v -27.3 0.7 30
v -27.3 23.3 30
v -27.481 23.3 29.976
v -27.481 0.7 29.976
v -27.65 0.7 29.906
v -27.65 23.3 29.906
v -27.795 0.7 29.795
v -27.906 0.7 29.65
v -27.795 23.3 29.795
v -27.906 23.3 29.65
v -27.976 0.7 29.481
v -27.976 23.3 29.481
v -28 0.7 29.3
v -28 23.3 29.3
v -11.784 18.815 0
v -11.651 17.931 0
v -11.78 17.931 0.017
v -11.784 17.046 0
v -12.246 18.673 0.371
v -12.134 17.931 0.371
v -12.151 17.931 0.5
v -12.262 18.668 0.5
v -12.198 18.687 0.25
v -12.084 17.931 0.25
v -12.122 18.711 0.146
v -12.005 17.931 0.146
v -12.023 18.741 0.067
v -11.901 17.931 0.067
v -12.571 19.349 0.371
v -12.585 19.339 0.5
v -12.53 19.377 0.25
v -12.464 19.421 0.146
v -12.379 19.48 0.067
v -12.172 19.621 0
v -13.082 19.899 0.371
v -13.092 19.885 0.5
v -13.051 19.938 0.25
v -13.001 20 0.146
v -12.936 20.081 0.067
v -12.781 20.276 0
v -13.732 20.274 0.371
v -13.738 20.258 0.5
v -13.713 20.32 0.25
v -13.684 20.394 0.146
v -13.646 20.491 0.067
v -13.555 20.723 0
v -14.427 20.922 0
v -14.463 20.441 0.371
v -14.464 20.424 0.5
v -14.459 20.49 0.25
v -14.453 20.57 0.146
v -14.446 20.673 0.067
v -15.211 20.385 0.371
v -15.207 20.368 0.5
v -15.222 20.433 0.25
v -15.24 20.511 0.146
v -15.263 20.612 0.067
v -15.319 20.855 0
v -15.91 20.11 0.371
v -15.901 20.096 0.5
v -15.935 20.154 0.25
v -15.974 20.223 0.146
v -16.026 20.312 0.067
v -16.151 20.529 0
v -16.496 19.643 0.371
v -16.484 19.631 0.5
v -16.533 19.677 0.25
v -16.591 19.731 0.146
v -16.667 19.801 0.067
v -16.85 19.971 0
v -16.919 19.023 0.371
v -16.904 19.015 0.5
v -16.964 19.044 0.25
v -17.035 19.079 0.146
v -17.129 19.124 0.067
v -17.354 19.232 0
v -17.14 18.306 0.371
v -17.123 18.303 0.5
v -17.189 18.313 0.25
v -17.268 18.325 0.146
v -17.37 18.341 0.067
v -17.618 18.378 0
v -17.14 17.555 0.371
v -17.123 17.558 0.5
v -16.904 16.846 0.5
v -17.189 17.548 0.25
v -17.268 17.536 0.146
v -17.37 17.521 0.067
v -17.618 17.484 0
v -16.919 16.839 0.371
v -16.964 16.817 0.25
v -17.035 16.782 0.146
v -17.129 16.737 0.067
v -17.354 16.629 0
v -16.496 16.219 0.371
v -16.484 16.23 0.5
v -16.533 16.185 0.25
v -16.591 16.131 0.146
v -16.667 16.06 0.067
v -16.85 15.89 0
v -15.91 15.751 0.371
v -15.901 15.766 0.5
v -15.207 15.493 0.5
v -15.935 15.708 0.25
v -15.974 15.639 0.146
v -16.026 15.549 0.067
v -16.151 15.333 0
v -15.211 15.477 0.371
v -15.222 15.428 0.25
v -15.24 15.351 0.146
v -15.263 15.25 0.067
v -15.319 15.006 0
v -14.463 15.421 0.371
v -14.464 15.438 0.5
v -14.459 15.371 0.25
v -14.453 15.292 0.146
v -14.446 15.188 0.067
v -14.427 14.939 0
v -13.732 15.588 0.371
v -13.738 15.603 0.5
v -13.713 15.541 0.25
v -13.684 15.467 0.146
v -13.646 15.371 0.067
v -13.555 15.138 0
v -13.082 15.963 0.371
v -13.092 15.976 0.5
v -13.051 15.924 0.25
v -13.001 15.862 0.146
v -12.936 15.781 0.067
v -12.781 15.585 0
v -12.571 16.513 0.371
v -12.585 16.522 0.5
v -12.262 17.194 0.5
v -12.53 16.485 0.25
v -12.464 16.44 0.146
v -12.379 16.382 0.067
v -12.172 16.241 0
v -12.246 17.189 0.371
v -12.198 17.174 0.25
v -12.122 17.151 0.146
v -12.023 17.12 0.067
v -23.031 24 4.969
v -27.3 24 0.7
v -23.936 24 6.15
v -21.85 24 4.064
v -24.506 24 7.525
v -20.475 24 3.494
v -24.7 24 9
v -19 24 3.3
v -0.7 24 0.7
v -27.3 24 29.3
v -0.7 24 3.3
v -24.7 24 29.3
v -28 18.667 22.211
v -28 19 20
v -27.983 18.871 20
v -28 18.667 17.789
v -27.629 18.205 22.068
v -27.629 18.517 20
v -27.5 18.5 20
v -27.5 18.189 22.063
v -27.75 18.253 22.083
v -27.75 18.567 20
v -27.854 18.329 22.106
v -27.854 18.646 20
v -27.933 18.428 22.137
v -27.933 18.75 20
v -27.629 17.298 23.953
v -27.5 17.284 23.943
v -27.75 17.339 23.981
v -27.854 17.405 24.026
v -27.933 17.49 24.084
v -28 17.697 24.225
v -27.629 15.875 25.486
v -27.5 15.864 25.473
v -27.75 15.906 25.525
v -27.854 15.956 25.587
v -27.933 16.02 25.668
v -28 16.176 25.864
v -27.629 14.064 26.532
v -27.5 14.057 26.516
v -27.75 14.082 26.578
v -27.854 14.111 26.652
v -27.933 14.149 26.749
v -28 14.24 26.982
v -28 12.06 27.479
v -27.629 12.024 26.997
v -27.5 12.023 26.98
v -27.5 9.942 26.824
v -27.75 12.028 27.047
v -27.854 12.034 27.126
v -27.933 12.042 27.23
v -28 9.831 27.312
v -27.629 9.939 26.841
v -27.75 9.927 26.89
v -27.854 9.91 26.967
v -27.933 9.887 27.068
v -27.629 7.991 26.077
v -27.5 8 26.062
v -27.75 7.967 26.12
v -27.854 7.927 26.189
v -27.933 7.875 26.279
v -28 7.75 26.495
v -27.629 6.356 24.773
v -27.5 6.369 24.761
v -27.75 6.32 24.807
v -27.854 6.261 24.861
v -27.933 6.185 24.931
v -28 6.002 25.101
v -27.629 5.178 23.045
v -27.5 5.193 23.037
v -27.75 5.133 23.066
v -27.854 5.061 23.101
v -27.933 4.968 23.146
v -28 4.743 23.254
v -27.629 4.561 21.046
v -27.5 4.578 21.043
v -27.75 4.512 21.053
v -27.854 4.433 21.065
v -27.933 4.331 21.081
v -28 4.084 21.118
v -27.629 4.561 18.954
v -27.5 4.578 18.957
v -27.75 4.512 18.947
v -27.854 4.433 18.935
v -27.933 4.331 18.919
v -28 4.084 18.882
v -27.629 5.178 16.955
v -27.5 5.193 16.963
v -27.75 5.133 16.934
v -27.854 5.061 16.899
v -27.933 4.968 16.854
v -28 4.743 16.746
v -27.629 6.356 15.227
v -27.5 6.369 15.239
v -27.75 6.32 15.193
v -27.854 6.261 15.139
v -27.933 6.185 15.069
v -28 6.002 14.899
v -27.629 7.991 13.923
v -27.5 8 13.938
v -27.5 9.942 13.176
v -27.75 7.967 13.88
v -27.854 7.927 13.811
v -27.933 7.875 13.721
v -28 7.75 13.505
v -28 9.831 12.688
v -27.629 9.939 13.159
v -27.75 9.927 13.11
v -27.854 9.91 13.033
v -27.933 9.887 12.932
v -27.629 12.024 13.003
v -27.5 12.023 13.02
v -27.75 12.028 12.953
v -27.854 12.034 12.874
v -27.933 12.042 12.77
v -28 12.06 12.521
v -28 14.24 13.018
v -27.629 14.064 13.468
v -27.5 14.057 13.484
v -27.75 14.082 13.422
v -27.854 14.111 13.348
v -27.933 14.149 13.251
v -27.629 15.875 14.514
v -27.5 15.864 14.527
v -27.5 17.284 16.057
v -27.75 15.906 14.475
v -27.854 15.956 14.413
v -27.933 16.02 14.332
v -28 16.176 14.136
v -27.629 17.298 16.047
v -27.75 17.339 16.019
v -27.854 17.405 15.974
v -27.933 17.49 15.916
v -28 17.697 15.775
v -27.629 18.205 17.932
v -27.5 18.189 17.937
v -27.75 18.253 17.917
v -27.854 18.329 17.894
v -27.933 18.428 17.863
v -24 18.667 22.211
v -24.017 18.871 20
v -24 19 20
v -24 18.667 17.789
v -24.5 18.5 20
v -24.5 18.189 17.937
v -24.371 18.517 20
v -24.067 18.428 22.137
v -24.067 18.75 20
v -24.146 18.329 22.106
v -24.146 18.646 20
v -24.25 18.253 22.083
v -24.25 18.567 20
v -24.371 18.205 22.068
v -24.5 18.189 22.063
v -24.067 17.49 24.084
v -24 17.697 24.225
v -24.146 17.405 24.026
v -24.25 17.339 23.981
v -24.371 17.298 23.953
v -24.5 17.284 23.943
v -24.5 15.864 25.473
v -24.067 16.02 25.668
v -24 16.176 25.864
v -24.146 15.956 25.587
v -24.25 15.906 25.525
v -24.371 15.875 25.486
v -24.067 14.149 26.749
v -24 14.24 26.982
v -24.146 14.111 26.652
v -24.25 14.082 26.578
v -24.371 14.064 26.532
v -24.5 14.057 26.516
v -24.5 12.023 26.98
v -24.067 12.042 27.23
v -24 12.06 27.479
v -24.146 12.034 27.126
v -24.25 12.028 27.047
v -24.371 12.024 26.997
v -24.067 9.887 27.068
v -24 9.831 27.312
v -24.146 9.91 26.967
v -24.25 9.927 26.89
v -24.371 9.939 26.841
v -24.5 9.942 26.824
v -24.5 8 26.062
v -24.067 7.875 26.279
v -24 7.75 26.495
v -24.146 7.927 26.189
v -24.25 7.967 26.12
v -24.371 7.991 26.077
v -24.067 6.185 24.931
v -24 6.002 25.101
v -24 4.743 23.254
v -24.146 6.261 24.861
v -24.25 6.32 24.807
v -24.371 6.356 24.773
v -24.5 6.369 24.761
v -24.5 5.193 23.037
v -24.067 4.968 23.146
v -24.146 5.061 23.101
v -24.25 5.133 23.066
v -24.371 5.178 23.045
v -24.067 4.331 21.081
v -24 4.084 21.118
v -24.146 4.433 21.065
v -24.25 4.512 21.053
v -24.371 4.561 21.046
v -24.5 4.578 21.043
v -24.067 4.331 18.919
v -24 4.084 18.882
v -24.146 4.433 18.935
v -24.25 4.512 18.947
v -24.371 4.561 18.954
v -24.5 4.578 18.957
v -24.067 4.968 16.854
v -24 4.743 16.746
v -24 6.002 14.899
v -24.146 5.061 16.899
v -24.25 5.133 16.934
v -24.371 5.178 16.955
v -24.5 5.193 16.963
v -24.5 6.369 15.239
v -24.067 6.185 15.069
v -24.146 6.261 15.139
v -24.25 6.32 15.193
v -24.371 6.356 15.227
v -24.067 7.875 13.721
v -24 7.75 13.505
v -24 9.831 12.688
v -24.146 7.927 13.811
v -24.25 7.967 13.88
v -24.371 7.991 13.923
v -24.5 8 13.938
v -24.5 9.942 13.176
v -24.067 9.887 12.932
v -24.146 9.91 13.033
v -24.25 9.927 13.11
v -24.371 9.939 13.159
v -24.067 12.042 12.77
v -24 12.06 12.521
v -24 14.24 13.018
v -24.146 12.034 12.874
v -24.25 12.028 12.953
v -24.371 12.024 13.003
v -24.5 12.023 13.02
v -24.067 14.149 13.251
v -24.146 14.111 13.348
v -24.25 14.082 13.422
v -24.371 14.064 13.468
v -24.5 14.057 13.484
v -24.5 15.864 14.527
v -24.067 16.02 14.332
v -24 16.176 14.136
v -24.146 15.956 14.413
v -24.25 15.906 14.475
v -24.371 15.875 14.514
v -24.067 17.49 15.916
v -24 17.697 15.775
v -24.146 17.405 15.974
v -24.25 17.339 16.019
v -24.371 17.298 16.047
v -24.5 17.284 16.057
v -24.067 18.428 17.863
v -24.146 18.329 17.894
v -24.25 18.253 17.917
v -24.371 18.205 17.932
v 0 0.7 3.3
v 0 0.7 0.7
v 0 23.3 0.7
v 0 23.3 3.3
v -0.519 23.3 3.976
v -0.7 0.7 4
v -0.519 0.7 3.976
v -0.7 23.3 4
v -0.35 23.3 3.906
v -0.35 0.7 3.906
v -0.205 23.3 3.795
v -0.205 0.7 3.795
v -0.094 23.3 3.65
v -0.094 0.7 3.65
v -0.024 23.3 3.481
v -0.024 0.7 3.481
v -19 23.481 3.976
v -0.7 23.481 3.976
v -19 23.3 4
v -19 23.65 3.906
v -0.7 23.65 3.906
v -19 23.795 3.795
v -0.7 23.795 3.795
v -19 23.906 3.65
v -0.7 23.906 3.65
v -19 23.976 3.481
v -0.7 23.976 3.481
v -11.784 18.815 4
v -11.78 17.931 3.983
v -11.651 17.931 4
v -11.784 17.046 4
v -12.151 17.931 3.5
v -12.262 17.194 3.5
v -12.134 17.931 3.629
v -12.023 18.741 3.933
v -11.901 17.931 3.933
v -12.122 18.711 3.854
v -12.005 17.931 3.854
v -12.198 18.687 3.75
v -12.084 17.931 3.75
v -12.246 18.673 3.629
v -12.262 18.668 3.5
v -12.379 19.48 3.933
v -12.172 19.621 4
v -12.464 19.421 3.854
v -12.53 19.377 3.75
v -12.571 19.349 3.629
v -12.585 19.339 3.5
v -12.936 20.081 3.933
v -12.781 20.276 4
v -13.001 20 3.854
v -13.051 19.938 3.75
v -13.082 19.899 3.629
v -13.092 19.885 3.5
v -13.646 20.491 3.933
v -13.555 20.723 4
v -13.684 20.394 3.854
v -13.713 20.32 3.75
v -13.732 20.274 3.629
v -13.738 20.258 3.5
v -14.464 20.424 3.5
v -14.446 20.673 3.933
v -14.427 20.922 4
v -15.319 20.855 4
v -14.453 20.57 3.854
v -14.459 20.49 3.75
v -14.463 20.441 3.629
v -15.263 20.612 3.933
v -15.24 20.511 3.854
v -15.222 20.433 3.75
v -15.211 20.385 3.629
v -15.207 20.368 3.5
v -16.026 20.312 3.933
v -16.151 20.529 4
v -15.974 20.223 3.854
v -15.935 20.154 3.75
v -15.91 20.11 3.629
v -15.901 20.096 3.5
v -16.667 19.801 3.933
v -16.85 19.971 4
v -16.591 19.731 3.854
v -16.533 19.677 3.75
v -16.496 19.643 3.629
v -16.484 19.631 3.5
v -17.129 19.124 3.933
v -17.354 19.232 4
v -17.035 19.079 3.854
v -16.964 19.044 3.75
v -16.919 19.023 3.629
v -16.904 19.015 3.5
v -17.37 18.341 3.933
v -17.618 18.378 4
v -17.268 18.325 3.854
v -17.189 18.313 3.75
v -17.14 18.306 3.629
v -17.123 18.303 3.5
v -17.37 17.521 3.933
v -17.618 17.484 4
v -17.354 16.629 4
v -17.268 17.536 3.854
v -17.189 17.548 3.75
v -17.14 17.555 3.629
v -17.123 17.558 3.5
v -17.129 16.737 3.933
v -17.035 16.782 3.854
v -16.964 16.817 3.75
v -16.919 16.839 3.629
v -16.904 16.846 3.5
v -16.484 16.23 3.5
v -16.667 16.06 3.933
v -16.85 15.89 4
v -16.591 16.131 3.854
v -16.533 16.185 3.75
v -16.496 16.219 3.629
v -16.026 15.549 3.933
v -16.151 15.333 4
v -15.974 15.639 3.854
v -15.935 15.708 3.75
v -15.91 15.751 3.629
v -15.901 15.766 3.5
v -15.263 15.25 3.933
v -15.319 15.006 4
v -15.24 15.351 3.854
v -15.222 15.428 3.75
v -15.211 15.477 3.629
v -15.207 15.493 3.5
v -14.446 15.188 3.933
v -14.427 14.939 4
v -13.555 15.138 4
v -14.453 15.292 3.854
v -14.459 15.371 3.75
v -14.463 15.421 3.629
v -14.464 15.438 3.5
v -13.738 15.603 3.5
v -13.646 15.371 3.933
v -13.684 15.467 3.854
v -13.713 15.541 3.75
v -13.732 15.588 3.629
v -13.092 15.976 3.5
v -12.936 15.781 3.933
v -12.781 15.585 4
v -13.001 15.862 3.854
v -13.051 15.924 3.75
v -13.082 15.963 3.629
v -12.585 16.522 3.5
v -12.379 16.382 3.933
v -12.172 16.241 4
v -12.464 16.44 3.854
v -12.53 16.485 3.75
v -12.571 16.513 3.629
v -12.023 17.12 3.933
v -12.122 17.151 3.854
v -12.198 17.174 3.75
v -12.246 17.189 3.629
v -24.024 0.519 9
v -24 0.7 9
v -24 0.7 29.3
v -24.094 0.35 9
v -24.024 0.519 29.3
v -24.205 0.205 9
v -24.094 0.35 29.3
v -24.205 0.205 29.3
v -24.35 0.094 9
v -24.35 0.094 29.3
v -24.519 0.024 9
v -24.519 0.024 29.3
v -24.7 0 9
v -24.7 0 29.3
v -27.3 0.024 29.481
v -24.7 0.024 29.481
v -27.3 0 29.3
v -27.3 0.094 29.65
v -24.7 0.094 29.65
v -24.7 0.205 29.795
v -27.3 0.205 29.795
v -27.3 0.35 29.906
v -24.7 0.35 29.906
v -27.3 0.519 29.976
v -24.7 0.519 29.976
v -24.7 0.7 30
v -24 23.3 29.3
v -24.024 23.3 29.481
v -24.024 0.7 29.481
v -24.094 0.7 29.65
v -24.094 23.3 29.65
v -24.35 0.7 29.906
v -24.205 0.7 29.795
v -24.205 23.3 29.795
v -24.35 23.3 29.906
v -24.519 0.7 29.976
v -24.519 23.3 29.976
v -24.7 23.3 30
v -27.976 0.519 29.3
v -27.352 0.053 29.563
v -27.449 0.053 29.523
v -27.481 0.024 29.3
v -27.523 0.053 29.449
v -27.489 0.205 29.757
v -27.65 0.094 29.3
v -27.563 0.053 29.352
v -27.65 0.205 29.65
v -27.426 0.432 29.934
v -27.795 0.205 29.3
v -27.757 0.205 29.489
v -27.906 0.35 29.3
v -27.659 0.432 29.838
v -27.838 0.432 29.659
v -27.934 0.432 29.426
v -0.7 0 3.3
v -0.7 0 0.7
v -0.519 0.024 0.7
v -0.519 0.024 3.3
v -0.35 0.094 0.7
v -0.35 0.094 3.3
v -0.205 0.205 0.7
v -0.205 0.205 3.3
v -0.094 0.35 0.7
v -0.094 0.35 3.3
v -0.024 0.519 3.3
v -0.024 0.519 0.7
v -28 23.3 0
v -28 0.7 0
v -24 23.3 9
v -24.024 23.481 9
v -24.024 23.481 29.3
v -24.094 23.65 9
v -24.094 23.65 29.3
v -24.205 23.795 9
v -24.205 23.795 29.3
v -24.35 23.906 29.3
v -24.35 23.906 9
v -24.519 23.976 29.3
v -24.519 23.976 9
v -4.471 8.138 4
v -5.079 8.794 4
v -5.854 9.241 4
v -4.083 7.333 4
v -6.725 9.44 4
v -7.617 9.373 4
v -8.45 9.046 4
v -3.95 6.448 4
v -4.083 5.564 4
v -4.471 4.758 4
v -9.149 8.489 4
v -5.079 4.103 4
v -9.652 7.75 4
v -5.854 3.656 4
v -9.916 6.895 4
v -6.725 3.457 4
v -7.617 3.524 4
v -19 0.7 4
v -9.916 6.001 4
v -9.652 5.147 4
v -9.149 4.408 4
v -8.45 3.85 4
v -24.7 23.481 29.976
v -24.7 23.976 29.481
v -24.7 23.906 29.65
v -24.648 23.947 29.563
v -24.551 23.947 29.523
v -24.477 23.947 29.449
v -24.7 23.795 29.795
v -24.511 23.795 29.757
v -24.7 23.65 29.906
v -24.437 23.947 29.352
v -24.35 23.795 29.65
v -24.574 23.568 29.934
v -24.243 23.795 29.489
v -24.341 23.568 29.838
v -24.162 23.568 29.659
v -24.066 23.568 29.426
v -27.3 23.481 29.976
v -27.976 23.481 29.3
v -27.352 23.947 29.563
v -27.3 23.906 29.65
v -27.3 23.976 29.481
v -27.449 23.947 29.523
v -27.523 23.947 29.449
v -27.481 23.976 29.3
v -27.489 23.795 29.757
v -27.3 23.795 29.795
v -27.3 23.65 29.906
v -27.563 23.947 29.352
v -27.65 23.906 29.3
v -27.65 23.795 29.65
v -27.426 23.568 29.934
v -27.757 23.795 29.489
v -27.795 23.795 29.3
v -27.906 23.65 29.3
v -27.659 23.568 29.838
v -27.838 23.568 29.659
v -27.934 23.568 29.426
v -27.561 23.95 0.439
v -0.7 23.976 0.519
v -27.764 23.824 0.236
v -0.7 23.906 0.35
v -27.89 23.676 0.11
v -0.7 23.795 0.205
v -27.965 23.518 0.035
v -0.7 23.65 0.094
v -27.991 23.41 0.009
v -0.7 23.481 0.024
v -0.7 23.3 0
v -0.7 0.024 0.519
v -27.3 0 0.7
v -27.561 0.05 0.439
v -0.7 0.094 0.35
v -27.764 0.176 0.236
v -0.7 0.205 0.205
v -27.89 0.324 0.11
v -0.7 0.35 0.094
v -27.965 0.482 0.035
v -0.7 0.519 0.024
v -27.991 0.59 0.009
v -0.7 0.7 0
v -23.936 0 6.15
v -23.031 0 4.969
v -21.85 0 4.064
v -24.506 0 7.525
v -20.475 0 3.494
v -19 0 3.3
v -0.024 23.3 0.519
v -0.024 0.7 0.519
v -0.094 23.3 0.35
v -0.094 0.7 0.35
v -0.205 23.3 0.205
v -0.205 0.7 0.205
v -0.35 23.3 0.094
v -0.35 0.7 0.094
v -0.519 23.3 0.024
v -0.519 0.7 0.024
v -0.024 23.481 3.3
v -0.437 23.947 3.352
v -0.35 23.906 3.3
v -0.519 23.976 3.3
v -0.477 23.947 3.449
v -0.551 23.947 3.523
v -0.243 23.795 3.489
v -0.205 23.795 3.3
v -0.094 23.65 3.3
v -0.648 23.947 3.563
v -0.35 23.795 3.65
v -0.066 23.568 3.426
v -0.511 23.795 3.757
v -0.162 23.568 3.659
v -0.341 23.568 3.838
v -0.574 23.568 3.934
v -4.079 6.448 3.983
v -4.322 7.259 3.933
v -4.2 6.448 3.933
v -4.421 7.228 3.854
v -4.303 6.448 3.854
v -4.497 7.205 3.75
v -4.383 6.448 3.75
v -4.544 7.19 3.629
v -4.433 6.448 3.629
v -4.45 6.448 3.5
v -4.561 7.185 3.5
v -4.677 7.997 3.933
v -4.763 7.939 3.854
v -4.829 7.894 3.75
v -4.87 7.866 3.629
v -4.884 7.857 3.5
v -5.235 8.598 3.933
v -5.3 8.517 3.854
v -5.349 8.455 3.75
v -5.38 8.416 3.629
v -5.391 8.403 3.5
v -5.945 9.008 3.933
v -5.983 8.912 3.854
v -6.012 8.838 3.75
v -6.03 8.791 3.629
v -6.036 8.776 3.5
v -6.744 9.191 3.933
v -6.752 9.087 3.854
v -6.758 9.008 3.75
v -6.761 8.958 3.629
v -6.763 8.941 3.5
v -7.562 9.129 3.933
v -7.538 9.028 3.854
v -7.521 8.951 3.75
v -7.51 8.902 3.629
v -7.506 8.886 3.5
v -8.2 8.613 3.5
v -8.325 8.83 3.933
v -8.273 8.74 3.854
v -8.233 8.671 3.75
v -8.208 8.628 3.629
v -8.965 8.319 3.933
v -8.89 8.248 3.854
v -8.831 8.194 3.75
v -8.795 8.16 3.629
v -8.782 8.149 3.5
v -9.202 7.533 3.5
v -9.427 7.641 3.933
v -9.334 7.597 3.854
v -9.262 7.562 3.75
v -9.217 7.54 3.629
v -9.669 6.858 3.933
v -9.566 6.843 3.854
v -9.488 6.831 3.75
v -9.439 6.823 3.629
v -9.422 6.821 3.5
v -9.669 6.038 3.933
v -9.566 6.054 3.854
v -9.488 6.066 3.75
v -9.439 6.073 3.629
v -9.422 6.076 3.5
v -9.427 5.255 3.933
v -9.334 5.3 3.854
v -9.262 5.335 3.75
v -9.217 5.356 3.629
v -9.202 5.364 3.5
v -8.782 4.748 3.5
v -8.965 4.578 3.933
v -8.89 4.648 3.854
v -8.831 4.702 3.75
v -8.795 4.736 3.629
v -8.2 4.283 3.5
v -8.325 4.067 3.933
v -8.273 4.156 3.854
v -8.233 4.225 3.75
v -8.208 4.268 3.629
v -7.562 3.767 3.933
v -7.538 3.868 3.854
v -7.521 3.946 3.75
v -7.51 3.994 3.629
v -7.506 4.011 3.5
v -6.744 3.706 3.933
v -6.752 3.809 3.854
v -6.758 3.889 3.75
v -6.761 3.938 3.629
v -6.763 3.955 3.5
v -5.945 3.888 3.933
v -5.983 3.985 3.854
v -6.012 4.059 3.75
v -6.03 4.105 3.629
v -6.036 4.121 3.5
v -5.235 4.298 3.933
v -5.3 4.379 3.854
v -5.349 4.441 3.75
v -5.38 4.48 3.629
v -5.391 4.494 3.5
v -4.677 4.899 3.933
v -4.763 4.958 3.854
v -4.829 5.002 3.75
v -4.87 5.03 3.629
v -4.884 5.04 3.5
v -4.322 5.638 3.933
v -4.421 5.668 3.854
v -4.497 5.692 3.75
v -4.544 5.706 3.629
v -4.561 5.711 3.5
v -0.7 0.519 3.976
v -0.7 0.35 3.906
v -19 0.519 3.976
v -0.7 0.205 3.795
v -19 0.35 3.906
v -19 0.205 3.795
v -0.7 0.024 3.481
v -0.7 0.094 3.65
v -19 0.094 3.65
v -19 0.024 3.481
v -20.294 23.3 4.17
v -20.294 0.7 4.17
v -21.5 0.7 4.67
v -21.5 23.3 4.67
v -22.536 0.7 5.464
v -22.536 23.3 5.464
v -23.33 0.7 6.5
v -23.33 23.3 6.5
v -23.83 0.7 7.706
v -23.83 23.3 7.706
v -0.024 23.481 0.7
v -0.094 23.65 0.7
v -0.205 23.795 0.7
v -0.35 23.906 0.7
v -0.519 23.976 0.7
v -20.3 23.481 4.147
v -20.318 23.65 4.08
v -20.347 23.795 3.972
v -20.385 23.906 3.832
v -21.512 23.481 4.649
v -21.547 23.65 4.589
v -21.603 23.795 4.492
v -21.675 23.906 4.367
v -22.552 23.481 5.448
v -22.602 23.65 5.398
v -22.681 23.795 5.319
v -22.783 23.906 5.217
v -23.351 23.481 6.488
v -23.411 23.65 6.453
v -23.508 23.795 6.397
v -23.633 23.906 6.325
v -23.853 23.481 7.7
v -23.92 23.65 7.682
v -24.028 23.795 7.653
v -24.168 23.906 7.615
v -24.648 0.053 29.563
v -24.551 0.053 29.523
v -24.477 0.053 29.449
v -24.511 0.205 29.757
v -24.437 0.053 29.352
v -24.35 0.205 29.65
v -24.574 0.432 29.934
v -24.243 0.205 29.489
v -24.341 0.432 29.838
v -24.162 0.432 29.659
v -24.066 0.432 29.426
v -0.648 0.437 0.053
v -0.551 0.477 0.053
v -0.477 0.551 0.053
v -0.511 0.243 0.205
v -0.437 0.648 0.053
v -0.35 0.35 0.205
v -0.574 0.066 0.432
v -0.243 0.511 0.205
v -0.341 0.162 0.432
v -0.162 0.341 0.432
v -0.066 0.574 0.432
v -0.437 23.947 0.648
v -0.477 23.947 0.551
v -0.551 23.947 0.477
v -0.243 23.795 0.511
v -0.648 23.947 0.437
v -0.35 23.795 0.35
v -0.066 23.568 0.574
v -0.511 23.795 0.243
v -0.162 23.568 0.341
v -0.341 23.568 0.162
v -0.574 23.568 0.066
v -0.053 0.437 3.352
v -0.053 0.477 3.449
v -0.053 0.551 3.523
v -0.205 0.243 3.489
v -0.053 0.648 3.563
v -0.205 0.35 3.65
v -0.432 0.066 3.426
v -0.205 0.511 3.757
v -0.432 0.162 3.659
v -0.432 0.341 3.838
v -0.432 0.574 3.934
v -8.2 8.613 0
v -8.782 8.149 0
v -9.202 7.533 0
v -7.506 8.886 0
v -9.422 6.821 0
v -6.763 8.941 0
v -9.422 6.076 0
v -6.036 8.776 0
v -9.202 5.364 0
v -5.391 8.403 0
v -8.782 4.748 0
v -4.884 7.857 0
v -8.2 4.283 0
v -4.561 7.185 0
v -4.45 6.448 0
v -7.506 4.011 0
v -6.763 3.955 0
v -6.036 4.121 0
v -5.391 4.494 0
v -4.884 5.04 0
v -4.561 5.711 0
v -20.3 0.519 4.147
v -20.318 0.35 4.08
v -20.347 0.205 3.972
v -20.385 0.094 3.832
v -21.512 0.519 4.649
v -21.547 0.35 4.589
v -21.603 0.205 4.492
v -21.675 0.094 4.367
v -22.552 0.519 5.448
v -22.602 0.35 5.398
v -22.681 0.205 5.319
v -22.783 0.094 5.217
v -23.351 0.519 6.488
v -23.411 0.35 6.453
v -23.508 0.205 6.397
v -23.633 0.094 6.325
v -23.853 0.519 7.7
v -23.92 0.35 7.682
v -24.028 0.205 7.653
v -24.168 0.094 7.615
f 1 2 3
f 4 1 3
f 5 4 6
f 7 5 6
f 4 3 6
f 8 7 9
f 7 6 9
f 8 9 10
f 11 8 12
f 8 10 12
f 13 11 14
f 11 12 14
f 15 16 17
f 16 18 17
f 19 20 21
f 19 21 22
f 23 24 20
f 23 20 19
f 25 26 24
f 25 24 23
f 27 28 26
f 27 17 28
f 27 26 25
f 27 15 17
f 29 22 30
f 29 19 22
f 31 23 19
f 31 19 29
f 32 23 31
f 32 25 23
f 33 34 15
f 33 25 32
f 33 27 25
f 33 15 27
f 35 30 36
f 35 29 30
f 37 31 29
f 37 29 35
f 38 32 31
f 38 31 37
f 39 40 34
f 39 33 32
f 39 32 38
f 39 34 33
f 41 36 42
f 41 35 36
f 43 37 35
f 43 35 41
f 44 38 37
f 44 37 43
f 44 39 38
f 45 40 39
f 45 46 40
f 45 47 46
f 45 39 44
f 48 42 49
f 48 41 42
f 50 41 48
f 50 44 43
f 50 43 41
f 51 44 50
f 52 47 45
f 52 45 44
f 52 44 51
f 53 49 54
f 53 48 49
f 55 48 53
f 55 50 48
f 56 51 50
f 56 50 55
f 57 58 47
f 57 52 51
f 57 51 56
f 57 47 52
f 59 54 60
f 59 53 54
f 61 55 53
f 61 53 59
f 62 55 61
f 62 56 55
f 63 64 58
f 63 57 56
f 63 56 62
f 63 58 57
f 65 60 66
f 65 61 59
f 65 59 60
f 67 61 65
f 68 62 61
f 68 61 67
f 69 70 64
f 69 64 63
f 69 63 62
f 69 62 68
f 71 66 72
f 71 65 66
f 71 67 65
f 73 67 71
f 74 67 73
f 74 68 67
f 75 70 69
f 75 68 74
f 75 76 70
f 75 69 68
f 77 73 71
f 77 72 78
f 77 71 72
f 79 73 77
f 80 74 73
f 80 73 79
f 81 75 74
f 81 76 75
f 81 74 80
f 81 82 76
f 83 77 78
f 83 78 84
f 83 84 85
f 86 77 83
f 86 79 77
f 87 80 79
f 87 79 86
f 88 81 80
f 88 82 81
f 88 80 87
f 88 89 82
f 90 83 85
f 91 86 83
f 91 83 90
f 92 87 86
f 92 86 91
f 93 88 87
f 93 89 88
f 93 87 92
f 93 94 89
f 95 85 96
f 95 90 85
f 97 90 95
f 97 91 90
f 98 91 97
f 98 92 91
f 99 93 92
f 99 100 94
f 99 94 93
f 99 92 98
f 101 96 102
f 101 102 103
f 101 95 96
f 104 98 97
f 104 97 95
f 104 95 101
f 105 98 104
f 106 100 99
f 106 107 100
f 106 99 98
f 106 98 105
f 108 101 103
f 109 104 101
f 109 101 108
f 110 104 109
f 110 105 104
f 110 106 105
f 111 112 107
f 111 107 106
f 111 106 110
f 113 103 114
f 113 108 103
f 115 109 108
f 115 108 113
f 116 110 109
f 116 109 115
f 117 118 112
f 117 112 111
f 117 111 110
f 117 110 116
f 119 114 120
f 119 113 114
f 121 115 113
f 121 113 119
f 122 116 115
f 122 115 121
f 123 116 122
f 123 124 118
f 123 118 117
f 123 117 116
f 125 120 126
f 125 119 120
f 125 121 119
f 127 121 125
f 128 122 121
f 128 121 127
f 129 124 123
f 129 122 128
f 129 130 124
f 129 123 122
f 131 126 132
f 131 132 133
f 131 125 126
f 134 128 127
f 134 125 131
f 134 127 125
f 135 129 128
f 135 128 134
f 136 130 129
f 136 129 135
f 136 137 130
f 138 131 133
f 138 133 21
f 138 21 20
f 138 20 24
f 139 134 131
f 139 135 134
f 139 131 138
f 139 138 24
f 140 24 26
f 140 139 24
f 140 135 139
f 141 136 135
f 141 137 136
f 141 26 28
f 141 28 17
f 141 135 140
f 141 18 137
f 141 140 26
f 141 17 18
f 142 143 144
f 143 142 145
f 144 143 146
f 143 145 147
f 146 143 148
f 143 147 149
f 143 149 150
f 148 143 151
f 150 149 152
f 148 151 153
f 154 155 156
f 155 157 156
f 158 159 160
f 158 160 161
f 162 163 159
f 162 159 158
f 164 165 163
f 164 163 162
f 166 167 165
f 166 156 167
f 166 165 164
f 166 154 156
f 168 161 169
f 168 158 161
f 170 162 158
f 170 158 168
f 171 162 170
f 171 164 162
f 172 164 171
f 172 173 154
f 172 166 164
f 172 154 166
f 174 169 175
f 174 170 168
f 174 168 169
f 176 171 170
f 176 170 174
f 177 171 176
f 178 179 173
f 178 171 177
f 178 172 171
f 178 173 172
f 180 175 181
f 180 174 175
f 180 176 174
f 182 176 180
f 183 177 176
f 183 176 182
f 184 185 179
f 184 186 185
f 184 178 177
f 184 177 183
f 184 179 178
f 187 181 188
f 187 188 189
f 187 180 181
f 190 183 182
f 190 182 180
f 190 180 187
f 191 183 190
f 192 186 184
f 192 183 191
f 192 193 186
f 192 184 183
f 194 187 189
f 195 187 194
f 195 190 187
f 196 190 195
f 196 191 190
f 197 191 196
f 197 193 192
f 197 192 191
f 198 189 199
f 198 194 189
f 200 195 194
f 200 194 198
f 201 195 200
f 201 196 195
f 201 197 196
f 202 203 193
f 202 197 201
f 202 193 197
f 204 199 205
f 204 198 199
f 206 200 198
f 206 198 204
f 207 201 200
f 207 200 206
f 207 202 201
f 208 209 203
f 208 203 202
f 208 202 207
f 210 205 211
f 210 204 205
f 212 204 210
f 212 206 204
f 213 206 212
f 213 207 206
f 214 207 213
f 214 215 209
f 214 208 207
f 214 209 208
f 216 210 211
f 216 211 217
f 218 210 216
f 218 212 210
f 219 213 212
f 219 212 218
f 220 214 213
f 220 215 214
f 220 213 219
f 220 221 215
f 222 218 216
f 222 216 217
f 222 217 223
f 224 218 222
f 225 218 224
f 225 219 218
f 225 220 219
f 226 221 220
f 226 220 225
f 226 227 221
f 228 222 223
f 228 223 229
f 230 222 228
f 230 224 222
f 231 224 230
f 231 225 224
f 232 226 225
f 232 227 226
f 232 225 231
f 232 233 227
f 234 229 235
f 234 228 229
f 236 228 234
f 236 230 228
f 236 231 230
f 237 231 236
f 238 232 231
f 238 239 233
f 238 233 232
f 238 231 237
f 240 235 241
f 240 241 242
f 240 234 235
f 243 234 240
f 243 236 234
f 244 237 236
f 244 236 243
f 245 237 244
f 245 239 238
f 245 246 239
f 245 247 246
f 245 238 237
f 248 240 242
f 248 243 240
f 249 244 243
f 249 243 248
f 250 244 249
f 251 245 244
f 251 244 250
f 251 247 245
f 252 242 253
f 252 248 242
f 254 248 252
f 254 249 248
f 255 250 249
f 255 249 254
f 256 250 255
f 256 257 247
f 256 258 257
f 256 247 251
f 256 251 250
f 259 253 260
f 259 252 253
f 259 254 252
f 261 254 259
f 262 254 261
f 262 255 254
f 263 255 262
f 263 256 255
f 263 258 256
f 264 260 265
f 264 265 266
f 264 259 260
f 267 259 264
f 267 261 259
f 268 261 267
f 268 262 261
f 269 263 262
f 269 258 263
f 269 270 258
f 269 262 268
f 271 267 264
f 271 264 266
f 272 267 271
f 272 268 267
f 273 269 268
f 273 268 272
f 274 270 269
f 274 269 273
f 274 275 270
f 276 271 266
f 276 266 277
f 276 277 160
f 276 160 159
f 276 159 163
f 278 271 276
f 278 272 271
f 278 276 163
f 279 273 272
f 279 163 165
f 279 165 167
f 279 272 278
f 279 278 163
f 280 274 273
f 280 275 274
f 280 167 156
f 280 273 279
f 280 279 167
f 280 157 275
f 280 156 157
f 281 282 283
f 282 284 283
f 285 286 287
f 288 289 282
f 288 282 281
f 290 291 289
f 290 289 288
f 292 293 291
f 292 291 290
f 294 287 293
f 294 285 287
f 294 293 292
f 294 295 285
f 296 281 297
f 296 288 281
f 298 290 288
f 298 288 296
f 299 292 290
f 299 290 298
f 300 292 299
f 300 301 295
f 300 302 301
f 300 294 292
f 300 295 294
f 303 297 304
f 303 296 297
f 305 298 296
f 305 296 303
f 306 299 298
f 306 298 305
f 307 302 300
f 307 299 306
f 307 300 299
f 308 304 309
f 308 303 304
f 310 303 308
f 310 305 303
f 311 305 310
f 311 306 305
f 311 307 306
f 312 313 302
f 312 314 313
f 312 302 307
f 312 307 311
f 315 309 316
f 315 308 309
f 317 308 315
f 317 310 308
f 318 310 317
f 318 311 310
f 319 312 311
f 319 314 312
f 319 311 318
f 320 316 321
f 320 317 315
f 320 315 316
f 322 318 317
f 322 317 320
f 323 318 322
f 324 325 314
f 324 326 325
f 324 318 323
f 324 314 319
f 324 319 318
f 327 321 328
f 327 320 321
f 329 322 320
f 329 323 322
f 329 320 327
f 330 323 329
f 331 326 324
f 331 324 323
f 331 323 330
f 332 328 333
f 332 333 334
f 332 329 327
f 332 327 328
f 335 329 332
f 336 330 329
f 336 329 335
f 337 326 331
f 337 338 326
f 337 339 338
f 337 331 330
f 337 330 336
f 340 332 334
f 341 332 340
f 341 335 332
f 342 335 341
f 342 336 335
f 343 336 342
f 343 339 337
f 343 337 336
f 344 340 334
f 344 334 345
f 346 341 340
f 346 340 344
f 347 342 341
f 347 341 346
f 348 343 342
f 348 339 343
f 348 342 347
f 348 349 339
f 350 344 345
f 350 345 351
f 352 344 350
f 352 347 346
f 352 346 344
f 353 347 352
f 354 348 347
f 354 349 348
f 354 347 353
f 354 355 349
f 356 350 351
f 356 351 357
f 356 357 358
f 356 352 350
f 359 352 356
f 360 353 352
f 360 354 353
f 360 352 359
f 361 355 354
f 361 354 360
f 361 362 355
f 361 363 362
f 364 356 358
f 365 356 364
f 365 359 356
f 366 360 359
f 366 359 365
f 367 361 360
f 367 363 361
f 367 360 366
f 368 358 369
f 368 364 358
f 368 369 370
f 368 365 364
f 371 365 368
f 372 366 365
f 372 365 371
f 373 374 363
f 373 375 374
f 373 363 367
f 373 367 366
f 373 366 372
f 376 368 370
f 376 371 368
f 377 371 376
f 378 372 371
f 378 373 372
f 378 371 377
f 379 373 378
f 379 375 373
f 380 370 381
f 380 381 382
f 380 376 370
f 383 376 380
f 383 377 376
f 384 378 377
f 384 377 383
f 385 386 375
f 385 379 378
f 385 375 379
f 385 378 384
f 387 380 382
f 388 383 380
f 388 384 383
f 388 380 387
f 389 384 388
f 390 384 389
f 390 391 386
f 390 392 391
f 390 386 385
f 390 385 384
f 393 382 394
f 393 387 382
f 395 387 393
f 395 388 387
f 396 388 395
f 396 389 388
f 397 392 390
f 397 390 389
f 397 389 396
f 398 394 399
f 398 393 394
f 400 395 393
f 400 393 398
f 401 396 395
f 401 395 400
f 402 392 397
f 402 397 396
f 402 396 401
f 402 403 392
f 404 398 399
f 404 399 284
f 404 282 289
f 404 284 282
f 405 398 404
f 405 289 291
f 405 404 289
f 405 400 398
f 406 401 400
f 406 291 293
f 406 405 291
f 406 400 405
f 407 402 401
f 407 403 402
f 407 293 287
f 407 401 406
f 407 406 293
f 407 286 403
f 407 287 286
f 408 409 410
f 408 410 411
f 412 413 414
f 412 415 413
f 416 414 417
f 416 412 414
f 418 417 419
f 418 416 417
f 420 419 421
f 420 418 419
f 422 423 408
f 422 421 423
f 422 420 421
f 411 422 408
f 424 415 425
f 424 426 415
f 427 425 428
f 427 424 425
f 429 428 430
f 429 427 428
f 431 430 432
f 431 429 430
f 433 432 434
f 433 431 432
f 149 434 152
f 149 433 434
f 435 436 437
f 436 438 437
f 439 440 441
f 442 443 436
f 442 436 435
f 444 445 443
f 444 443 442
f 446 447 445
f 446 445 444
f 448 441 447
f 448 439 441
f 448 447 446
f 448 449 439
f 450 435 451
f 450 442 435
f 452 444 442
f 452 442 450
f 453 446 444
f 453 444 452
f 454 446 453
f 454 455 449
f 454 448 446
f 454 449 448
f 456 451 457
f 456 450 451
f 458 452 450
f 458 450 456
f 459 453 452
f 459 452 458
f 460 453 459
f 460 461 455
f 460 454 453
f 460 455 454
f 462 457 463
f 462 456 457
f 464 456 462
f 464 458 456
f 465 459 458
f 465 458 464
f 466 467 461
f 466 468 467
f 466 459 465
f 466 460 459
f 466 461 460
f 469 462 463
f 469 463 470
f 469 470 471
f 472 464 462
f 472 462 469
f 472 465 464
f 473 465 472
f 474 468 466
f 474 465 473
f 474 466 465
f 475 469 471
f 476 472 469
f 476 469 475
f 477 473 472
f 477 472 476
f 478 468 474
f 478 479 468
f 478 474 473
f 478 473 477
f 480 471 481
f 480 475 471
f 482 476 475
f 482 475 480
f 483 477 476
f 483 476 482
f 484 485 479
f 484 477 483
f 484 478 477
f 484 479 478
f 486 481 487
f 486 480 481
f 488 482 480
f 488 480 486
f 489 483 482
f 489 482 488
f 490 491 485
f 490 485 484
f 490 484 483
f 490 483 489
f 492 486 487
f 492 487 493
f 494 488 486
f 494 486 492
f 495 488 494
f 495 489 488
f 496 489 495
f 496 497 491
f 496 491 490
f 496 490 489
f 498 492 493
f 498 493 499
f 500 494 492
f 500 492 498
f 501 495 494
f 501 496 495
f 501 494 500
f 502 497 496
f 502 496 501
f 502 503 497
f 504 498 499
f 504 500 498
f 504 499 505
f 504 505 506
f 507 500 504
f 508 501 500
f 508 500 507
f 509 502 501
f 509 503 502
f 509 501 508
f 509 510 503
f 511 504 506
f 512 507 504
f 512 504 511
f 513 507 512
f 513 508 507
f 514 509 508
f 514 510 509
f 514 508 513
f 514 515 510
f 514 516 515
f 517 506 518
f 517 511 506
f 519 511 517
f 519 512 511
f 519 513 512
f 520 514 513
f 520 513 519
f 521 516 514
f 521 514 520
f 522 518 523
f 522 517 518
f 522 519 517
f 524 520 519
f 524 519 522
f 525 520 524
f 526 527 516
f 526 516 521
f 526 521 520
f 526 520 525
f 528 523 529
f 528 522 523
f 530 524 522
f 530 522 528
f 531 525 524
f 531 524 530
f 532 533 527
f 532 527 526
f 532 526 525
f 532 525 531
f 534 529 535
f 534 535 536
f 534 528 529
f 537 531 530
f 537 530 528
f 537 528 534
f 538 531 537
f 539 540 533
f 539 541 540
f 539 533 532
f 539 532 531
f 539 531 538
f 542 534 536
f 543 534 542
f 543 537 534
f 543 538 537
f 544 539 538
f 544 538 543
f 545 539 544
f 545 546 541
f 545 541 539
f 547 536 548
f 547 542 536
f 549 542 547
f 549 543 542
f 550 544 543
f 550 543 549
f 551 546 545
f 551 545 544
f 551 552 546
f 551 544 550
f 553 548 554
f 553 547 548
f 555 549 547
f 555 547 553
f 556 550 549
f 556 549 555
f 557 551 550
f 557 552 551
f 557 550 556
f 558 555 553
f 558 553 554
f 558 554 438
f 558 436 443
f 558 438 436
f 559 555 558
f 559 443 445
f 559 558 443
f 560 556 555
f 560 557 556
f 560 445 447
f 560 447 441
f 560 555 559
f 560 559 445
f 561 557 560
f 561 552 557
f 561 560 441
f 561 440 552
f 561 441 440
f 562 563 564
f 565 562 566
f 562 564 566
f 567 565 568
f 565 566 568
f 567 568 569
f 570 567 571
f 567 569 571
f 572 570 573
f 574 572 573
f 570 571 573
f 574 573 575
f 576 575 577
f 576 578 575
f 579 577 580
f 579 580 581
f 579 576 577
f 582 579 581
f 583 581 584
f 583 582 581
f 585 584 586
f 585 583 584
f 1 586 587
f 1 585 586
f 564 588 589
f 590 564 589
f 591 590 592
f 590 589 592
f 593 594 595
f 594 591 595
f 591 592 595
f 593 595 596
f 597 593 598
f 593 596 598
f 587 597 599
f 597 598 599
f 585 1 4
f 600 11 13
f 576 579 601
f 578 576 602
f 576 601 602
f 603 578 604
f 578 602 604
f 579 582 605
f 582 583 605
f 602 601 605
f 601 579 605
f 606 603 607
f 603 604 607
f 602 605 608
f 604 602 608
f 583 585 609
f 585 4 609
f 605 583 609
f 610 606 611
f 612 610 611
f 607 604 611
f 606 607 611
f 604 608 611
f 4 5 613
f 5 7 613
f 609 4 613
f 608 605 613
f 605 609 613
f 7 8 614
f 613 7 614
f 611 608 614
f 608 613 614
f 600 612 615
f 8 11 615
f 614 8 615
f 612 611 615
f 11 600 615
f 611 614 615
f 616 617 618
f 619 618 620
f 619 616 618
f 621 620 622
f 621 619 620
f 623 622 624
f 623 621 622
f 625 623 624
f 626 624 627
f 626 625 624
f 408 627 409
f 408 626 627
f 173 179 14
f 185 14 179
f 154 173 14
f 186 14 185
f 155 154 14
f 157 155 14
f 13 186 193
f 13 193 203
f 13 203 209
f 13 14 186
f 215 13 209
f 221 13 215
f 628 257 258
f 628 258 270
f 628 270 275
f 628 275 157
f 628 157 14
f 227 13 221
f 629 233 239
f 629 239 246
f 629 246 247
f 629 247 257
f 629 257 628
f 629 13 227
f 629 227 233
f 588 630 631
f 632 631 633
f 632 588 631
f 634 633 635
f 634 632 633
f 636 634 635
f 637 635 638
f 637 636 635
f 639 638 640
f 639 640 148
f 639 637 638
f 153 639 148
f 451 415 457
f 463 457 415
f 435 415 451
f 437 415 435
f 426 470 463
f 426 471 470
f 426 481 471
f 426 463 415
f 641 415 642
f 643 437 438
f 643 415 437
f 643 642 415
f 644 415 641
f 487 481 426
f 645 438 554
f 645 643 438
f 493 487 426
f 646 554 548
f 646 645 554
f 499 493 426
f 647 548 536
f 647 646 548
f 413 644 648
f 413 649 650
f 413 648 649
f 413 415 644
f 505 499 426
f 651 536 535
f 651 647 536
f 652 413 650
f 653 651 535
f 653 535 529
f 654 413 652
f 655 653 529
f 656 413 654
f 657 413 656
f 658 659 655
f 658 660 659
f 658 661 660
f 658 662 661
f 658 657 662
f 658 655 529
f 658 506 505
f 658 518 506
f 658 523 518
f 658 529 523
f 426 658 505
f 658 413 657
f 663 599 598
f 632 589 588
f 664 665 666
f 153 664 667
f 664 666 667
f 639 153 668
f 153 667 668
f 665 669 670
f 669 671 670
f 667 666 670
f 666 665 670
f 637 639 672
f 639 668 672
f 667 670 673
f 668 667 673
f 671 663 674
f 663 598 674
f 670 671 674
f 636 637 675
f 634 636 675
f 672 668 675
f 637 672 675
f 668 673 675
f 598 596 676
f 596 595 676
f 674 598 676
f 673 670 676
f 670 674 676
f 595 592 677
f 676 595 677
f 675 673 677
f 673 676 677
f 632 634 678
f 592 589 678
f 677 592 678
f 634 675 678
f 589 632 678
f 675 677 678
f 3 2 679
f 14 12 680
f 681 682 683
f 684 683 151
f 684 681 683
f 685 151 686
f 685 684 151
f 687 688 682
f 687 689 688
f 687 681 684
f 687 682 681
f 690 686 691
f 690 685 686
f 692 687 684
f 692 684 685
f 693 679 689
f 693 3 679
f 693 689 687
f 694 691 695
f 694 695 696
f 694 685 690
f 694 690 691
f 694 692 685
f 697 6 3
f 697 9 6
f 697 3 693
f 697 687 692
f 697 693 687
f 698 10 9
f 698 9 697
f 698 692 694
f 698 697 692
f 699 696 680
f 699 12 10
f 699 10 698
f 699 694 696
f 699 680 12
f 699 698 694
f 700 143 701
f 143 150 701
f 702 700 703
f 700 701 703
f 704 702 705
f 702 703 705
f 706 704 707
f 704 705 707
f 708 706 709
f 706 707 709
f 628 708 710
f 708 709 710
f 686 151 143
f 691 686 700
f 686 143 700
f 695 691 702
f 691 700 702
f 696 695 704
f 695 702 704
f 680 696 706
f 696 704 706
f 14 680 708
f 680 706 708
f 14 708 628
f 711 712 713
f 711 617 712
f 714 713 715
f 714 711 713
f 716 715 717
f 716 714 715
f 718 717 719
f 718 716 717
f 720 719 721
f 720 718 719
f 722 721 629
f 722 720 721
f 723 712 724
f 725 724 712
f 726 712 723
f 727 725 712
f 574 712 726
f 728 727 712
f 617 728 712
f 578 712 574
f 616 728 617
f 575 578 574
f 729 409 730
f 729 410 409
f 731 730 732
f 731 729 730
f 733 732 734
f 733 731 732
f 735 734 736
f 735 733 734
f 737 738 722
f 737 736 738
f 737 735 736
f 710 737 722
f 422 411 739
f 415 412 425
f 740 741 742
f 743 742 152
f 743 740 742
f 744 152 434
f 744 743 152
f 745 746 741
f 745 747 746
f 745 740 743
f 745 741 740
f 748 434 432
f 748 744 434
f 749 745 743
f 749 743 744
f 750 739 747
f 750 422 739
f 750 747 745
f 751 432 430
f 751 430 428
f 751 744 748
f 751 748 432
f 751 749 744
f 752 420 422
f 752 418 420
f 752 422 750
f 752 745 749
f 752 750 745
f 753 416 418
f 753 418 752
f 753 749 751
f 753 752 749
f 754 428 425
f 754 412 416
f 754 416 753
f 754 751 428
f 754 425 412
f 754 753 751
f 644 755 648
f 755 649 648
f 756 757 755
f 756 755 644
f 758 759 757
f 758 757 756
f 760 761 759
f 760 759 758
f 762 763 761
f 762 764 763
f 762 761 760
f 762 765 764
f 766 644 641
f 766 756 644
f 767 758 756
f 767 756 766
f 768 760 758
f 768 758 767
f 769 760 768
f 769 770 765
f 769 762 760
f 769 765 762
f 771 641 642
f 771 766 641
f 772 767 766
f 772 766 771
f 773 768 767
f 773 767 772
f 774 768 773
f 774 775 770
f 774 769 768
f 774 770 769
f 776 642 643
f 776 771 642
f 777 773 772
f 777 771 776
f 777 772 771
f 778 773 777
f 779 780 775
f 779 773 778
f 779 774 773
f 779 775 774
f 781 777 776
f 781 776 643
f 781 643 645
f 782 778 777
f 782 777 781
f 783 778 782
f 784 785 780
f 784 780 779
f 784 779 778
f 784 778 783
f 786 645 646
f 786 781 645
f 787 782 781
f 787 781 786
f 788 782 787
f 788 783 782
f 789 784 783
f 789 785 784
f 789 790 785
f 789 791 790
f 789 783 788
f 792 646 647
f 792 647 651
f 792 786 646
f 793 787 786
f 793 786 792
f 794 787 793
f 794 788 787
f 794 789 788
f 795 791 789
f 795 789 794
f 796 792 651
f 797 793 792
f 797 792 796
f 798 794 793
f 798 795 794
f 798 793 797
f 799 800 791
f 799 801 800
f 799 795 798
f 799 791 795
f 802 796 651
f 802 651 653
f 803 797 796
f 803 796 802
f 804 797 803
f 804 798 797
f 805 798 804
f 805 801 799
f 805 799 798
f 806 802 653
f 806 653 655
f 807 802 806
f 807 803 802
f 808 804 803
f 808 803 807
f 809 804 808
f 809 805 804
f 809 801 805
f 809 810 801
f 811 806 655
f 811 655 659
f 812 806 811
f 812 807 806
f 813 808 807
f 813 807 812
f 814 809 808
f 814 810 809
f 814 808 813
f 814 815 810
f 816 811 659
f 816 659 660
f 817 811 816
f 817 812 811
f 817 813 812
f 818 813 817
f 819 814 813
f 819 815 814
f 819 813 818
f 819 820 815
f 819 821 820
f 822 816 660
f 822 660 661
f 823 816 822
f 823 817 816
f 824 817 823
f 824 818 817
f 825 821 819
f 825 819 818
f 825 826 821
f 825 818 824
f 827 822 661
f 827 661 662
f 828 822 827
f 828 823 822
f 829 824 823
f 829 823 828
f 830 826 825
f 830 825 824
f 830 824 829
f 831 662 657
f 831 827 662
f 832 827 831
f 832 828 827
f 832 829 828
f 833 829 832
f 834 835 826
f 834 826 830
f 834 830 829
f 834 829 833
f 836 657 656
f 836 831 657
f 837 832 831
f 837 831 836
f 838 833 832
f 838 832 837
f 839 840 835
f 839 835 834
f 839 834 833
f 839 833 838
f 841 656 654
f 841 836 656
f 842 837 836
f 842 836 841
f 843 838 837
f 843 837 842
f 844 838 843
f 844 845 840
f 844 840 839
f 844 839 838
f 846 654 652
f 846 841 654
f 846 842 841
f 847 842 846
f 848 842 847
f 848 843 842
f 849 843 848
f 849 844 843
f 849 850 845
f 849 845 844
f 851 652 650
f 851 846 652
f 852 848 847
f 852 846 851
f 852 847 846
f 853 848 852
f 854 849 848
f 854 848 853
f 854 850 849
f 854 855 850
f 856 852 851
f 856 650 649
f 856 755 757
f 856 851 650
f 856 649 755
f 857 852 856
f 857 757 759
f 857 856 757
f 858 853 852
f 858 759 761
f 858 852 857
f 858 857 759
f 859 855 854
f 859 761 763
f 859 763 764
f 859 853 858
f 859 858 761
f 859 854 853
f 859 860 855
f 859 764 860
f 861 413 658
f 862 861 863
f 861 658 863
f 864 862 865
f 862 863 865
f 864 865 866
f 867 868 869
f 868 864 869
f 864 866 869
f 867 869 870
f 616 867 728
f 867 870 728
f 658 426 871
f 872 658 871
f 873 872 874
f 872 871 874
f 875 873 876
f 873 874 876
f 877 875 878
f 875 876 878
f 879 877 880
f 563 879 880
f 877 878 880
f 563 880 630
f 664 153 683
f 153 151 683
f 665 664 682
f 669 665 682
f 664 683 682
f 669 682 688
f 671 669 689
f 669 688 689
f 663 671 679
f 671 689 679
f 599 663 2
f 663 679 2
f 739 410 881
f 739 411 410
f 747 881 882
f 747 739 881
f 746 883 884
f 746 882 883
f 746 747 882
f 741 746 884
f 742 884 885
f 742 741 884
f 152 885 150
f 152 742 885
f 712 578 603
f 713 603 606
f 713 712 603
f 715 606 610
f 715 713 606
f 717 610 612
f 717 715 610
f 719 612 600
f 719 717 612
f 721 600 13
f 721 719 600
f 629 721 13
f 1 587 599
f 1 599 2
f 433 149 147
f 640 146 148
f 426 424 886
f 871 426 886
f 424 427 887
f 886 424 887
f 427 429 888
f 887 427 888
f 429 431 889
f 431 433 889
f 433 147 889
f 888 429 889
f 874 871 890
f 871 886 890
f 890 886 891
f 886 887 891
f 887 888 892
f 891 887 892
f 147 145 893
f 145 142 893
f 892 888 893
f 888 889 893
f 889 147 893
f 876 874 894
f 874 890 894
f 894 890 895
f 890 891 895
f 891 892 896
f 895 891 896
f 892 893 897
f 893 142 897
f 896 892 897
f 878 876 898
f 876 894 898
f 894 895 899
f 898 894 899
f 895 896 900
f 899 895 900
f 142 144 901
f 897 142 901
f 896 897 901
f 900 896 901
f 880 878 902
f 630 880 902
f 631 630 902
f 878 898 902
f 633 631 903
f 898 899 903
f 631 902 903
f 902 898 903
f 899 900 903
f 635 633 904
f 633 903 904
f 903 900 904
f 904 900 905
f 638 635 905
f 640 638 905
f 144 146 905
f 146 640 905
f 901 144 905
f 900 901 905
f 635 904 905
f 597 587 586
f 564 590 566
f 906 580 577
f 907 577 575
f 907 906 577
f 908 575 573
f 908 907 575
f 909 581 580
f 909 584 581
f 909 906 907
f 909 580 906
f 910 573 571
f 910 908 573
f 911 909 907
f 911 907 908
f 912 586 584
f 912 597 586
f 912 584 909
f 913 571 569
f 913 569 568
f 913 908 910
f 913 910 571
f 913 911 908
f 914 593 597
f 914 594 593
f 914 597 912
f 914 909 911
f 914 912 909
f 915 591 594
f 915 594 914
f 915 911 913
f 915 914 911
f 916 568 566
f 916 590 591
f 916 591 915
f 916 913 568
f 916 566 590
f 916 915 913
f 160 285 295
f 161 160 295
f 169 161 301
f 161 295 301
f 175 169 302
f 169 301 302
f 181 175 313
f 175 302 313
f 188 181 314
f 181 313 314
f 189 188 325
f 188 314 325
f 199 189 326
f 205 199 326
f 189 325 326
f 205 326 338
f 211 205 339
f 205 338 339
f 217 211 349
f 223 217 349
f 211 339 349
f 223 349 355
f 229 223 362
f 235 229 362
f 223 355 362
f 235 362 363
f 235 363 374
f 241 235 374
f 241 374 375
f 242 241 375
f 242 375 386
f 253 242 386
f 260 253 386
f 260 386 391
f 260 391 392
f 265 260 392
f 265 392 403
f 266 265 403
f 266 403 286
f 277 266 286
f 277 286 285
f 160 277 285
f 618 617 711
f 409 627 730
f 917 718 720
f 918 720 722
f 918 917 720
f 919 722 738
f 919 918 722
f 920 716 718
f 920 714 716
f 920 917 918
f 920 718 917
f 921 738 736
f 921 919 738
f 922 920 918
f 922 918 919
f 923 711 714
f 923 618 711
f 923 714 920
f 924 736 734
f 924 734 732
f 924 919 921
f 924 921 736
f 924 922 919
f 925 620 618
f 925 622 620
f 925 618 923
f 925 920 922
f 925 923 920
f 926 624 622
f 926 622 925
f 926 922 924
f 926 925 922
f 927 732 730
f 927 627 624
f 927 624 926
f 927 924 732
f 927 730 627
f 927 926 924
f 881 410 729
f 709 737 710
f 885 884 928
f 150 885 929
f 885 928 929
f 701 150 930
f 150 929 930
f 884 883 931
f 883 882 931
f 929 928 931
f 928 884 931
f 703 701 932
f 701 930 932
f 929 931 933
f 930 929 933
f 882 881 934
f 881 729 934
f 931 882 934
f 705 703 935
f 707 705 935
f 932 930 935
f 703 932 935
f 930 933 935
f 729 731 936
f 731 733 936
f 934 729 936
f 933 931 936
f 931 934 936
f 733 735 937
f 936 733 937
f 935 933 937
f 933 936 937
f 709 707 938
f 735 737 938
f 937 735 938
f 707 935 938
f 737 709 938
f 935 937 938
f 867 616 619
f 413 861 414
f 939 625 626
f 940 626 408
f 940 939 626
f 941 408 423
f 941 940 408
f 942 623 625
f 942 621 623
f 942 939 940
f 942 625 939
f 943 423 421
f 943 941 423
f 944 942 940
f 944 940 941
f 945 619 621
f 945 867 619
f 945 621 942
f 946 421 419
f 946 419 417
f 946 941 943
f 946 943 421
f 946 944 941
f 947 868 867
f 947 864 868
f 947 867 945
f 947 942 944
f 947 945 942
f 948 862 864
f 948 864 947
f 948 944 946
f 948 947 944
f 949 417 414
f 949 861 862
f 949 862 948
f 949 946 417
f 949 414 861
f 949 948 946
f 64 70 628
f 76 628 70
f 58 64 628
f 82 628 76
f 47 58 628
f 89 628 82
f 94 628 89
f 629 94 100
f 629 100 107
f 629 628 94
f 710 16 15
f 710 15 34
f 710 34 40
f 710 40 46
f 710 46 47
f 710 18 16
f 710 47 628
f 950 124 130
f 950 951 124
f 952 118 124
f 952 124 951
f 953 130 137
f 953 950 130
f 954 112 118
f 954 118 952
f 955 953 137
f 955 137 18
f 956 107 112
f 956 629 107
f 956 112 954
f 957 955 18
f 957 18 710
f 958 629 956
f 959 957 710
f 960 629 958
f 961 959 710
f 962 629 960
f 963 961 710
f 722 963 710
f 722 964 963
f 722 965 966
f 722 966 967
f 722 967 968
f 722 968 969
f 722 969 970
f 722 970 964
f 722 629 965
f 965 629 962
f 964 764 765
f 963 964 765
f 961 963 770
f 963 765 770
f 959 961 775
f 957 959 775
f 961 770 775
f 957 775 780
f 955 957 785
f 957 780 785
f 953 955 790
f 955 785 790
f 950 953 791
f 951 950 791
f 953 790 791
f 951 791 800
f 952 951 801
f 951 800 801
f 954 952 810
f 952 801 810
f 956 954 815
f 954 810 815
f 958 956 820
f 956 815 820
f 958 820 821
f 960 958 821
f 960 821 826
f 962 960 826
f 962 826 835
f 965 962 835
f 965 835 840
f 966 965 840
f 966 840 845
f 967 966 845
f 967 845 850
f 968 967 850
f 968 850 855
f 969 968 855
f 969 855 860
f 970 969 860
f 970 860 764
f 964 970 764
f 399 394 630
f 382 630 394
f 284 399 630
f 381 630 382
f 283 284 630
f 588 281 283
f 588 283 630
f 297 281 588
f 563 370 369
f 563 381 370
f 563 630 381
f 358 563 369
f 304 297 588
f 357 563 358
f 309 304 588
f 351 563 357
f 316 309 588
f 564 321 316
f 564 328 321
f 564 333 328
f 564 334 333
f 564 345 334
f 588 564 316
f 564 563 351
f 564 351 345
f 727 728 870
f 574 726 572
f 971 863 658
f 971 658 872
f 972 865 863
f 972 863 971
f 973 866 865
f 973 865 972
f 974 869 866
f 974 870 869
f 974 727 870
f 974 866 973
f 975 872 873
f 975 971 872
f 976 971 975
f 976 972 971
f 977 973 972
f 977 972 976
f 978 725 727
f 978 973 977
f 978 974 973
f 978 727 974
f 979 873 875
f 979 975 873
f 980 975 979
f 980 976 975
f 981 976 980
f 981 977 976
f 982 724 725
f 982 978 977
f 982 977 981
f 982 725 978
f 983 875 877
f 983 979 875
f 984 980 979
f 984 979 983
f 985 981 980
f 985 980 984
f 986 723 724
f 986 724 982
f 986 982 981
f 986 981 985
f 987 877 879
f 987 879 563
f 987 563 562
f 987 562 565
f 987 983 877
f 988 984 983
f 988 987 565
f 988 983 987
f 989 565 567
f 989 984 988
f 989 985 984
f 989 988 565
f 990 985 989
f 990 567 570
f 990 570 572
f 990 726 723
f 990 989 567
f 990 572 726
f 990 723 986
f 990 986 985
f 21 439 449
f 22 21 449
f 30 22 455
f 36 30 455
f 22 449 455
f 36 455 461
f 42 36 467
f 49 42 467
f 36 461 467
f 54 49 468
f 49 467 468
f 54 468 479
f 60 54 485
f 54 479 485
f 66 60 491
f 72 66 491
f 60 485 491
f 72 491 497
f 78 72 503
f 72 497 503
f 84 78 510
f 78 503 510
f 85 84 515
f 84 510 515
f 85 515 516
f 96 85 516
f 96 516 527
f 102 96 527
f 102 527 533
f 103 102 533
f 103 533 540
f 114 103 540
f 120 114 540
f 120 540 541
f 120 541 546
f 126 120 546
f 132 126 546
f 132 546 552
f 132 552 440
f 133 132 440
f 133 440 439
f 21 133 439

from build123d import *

# Parameters (mm, degrees)
F1_DEPTH = 24
F2_R     = 2.5
F3_DEPTH = 25
F4_R     = 7
F5_DEPTH = 25
F6_R     = 5
F7_R     = 0.7
F8_R     = 0.5


with BuildPart() as f1:
    # F0 (on Front) → F1 (new body)
    with BuildSketch(Plane.XZ):
        Polygon((0, 4), (-24, 4), (-24, 30), (-28, 30), (-28, 0), (0, 0), align=None)
    extrude(amount=-F1_DEPTH)

    # F2 (on face) → F3 (cut)
    with BuildSketch(Plane.XY.offset(4)):
        with Locations((-14.651088044, 17.9306399077)):
            Circle(F2_R)
        with Locations((-6.9495881908, 6.4483168535)):
            Circle(F2_R)
    extrude(amount=-F3_DEPTH, mode=Mode.SUBTRACT)

    # F4 (on face) → F5 (cut)
    with BuildSketch(Plane.YZ.offset(-24)):
        with Locations((11.5, 20)):
            Circle(F4_R)
    extrude(amount=-F5_DEPTH, mode=Mode.SUBTRACT)

    # F6
    f6_edges = [f1.edges().sort_by_distance(p)[0] for p in [
        (-24, 12, 4),
    ]]
    fillet(f6_edges, radius=F6_R)

    # F7
    f7_edges = [f1.edges().sort_by_distance(p)[0] for p in [
        (-24, 12, 30),
        (-28, 12, 30),
        (-26, 0, 30),
        (-26, 24, 30),
        (-9.5, 0, 4),
        (-22.535534, 0, 5.464466),
        (0, 0, 2),
        (-24, 0, 19.5),
        (-14, 0, 0),
        (-28, 0, 15),
        (0, 12, 0),
        (0, 12, 4),
        (0, 24, 2),
        (-9.5, 24, 4),
        (-22.535534, 24, 5.464466),
        (-24, 24, 19.5),
        (-14, 24, 0),
        (-28, 24, 15),
    ]]
    fillet(f7_edges, radius=F7_R)

    # F8
    f8_edges = [f1.edges().sort_by_distance(p)[0] for p in [
        (-17.151088, 17.93064, 0),
        (-9.449588, 6.448317, 4),
        (-17.151088, 17.93064, 4),
        (-24, 4.5, 20),
        (-26, 18.5, 20),
        (-28, 4.5, 20),
    ]]
    fillet(f8_edges, radius=F8_R)


solid = f1.part
